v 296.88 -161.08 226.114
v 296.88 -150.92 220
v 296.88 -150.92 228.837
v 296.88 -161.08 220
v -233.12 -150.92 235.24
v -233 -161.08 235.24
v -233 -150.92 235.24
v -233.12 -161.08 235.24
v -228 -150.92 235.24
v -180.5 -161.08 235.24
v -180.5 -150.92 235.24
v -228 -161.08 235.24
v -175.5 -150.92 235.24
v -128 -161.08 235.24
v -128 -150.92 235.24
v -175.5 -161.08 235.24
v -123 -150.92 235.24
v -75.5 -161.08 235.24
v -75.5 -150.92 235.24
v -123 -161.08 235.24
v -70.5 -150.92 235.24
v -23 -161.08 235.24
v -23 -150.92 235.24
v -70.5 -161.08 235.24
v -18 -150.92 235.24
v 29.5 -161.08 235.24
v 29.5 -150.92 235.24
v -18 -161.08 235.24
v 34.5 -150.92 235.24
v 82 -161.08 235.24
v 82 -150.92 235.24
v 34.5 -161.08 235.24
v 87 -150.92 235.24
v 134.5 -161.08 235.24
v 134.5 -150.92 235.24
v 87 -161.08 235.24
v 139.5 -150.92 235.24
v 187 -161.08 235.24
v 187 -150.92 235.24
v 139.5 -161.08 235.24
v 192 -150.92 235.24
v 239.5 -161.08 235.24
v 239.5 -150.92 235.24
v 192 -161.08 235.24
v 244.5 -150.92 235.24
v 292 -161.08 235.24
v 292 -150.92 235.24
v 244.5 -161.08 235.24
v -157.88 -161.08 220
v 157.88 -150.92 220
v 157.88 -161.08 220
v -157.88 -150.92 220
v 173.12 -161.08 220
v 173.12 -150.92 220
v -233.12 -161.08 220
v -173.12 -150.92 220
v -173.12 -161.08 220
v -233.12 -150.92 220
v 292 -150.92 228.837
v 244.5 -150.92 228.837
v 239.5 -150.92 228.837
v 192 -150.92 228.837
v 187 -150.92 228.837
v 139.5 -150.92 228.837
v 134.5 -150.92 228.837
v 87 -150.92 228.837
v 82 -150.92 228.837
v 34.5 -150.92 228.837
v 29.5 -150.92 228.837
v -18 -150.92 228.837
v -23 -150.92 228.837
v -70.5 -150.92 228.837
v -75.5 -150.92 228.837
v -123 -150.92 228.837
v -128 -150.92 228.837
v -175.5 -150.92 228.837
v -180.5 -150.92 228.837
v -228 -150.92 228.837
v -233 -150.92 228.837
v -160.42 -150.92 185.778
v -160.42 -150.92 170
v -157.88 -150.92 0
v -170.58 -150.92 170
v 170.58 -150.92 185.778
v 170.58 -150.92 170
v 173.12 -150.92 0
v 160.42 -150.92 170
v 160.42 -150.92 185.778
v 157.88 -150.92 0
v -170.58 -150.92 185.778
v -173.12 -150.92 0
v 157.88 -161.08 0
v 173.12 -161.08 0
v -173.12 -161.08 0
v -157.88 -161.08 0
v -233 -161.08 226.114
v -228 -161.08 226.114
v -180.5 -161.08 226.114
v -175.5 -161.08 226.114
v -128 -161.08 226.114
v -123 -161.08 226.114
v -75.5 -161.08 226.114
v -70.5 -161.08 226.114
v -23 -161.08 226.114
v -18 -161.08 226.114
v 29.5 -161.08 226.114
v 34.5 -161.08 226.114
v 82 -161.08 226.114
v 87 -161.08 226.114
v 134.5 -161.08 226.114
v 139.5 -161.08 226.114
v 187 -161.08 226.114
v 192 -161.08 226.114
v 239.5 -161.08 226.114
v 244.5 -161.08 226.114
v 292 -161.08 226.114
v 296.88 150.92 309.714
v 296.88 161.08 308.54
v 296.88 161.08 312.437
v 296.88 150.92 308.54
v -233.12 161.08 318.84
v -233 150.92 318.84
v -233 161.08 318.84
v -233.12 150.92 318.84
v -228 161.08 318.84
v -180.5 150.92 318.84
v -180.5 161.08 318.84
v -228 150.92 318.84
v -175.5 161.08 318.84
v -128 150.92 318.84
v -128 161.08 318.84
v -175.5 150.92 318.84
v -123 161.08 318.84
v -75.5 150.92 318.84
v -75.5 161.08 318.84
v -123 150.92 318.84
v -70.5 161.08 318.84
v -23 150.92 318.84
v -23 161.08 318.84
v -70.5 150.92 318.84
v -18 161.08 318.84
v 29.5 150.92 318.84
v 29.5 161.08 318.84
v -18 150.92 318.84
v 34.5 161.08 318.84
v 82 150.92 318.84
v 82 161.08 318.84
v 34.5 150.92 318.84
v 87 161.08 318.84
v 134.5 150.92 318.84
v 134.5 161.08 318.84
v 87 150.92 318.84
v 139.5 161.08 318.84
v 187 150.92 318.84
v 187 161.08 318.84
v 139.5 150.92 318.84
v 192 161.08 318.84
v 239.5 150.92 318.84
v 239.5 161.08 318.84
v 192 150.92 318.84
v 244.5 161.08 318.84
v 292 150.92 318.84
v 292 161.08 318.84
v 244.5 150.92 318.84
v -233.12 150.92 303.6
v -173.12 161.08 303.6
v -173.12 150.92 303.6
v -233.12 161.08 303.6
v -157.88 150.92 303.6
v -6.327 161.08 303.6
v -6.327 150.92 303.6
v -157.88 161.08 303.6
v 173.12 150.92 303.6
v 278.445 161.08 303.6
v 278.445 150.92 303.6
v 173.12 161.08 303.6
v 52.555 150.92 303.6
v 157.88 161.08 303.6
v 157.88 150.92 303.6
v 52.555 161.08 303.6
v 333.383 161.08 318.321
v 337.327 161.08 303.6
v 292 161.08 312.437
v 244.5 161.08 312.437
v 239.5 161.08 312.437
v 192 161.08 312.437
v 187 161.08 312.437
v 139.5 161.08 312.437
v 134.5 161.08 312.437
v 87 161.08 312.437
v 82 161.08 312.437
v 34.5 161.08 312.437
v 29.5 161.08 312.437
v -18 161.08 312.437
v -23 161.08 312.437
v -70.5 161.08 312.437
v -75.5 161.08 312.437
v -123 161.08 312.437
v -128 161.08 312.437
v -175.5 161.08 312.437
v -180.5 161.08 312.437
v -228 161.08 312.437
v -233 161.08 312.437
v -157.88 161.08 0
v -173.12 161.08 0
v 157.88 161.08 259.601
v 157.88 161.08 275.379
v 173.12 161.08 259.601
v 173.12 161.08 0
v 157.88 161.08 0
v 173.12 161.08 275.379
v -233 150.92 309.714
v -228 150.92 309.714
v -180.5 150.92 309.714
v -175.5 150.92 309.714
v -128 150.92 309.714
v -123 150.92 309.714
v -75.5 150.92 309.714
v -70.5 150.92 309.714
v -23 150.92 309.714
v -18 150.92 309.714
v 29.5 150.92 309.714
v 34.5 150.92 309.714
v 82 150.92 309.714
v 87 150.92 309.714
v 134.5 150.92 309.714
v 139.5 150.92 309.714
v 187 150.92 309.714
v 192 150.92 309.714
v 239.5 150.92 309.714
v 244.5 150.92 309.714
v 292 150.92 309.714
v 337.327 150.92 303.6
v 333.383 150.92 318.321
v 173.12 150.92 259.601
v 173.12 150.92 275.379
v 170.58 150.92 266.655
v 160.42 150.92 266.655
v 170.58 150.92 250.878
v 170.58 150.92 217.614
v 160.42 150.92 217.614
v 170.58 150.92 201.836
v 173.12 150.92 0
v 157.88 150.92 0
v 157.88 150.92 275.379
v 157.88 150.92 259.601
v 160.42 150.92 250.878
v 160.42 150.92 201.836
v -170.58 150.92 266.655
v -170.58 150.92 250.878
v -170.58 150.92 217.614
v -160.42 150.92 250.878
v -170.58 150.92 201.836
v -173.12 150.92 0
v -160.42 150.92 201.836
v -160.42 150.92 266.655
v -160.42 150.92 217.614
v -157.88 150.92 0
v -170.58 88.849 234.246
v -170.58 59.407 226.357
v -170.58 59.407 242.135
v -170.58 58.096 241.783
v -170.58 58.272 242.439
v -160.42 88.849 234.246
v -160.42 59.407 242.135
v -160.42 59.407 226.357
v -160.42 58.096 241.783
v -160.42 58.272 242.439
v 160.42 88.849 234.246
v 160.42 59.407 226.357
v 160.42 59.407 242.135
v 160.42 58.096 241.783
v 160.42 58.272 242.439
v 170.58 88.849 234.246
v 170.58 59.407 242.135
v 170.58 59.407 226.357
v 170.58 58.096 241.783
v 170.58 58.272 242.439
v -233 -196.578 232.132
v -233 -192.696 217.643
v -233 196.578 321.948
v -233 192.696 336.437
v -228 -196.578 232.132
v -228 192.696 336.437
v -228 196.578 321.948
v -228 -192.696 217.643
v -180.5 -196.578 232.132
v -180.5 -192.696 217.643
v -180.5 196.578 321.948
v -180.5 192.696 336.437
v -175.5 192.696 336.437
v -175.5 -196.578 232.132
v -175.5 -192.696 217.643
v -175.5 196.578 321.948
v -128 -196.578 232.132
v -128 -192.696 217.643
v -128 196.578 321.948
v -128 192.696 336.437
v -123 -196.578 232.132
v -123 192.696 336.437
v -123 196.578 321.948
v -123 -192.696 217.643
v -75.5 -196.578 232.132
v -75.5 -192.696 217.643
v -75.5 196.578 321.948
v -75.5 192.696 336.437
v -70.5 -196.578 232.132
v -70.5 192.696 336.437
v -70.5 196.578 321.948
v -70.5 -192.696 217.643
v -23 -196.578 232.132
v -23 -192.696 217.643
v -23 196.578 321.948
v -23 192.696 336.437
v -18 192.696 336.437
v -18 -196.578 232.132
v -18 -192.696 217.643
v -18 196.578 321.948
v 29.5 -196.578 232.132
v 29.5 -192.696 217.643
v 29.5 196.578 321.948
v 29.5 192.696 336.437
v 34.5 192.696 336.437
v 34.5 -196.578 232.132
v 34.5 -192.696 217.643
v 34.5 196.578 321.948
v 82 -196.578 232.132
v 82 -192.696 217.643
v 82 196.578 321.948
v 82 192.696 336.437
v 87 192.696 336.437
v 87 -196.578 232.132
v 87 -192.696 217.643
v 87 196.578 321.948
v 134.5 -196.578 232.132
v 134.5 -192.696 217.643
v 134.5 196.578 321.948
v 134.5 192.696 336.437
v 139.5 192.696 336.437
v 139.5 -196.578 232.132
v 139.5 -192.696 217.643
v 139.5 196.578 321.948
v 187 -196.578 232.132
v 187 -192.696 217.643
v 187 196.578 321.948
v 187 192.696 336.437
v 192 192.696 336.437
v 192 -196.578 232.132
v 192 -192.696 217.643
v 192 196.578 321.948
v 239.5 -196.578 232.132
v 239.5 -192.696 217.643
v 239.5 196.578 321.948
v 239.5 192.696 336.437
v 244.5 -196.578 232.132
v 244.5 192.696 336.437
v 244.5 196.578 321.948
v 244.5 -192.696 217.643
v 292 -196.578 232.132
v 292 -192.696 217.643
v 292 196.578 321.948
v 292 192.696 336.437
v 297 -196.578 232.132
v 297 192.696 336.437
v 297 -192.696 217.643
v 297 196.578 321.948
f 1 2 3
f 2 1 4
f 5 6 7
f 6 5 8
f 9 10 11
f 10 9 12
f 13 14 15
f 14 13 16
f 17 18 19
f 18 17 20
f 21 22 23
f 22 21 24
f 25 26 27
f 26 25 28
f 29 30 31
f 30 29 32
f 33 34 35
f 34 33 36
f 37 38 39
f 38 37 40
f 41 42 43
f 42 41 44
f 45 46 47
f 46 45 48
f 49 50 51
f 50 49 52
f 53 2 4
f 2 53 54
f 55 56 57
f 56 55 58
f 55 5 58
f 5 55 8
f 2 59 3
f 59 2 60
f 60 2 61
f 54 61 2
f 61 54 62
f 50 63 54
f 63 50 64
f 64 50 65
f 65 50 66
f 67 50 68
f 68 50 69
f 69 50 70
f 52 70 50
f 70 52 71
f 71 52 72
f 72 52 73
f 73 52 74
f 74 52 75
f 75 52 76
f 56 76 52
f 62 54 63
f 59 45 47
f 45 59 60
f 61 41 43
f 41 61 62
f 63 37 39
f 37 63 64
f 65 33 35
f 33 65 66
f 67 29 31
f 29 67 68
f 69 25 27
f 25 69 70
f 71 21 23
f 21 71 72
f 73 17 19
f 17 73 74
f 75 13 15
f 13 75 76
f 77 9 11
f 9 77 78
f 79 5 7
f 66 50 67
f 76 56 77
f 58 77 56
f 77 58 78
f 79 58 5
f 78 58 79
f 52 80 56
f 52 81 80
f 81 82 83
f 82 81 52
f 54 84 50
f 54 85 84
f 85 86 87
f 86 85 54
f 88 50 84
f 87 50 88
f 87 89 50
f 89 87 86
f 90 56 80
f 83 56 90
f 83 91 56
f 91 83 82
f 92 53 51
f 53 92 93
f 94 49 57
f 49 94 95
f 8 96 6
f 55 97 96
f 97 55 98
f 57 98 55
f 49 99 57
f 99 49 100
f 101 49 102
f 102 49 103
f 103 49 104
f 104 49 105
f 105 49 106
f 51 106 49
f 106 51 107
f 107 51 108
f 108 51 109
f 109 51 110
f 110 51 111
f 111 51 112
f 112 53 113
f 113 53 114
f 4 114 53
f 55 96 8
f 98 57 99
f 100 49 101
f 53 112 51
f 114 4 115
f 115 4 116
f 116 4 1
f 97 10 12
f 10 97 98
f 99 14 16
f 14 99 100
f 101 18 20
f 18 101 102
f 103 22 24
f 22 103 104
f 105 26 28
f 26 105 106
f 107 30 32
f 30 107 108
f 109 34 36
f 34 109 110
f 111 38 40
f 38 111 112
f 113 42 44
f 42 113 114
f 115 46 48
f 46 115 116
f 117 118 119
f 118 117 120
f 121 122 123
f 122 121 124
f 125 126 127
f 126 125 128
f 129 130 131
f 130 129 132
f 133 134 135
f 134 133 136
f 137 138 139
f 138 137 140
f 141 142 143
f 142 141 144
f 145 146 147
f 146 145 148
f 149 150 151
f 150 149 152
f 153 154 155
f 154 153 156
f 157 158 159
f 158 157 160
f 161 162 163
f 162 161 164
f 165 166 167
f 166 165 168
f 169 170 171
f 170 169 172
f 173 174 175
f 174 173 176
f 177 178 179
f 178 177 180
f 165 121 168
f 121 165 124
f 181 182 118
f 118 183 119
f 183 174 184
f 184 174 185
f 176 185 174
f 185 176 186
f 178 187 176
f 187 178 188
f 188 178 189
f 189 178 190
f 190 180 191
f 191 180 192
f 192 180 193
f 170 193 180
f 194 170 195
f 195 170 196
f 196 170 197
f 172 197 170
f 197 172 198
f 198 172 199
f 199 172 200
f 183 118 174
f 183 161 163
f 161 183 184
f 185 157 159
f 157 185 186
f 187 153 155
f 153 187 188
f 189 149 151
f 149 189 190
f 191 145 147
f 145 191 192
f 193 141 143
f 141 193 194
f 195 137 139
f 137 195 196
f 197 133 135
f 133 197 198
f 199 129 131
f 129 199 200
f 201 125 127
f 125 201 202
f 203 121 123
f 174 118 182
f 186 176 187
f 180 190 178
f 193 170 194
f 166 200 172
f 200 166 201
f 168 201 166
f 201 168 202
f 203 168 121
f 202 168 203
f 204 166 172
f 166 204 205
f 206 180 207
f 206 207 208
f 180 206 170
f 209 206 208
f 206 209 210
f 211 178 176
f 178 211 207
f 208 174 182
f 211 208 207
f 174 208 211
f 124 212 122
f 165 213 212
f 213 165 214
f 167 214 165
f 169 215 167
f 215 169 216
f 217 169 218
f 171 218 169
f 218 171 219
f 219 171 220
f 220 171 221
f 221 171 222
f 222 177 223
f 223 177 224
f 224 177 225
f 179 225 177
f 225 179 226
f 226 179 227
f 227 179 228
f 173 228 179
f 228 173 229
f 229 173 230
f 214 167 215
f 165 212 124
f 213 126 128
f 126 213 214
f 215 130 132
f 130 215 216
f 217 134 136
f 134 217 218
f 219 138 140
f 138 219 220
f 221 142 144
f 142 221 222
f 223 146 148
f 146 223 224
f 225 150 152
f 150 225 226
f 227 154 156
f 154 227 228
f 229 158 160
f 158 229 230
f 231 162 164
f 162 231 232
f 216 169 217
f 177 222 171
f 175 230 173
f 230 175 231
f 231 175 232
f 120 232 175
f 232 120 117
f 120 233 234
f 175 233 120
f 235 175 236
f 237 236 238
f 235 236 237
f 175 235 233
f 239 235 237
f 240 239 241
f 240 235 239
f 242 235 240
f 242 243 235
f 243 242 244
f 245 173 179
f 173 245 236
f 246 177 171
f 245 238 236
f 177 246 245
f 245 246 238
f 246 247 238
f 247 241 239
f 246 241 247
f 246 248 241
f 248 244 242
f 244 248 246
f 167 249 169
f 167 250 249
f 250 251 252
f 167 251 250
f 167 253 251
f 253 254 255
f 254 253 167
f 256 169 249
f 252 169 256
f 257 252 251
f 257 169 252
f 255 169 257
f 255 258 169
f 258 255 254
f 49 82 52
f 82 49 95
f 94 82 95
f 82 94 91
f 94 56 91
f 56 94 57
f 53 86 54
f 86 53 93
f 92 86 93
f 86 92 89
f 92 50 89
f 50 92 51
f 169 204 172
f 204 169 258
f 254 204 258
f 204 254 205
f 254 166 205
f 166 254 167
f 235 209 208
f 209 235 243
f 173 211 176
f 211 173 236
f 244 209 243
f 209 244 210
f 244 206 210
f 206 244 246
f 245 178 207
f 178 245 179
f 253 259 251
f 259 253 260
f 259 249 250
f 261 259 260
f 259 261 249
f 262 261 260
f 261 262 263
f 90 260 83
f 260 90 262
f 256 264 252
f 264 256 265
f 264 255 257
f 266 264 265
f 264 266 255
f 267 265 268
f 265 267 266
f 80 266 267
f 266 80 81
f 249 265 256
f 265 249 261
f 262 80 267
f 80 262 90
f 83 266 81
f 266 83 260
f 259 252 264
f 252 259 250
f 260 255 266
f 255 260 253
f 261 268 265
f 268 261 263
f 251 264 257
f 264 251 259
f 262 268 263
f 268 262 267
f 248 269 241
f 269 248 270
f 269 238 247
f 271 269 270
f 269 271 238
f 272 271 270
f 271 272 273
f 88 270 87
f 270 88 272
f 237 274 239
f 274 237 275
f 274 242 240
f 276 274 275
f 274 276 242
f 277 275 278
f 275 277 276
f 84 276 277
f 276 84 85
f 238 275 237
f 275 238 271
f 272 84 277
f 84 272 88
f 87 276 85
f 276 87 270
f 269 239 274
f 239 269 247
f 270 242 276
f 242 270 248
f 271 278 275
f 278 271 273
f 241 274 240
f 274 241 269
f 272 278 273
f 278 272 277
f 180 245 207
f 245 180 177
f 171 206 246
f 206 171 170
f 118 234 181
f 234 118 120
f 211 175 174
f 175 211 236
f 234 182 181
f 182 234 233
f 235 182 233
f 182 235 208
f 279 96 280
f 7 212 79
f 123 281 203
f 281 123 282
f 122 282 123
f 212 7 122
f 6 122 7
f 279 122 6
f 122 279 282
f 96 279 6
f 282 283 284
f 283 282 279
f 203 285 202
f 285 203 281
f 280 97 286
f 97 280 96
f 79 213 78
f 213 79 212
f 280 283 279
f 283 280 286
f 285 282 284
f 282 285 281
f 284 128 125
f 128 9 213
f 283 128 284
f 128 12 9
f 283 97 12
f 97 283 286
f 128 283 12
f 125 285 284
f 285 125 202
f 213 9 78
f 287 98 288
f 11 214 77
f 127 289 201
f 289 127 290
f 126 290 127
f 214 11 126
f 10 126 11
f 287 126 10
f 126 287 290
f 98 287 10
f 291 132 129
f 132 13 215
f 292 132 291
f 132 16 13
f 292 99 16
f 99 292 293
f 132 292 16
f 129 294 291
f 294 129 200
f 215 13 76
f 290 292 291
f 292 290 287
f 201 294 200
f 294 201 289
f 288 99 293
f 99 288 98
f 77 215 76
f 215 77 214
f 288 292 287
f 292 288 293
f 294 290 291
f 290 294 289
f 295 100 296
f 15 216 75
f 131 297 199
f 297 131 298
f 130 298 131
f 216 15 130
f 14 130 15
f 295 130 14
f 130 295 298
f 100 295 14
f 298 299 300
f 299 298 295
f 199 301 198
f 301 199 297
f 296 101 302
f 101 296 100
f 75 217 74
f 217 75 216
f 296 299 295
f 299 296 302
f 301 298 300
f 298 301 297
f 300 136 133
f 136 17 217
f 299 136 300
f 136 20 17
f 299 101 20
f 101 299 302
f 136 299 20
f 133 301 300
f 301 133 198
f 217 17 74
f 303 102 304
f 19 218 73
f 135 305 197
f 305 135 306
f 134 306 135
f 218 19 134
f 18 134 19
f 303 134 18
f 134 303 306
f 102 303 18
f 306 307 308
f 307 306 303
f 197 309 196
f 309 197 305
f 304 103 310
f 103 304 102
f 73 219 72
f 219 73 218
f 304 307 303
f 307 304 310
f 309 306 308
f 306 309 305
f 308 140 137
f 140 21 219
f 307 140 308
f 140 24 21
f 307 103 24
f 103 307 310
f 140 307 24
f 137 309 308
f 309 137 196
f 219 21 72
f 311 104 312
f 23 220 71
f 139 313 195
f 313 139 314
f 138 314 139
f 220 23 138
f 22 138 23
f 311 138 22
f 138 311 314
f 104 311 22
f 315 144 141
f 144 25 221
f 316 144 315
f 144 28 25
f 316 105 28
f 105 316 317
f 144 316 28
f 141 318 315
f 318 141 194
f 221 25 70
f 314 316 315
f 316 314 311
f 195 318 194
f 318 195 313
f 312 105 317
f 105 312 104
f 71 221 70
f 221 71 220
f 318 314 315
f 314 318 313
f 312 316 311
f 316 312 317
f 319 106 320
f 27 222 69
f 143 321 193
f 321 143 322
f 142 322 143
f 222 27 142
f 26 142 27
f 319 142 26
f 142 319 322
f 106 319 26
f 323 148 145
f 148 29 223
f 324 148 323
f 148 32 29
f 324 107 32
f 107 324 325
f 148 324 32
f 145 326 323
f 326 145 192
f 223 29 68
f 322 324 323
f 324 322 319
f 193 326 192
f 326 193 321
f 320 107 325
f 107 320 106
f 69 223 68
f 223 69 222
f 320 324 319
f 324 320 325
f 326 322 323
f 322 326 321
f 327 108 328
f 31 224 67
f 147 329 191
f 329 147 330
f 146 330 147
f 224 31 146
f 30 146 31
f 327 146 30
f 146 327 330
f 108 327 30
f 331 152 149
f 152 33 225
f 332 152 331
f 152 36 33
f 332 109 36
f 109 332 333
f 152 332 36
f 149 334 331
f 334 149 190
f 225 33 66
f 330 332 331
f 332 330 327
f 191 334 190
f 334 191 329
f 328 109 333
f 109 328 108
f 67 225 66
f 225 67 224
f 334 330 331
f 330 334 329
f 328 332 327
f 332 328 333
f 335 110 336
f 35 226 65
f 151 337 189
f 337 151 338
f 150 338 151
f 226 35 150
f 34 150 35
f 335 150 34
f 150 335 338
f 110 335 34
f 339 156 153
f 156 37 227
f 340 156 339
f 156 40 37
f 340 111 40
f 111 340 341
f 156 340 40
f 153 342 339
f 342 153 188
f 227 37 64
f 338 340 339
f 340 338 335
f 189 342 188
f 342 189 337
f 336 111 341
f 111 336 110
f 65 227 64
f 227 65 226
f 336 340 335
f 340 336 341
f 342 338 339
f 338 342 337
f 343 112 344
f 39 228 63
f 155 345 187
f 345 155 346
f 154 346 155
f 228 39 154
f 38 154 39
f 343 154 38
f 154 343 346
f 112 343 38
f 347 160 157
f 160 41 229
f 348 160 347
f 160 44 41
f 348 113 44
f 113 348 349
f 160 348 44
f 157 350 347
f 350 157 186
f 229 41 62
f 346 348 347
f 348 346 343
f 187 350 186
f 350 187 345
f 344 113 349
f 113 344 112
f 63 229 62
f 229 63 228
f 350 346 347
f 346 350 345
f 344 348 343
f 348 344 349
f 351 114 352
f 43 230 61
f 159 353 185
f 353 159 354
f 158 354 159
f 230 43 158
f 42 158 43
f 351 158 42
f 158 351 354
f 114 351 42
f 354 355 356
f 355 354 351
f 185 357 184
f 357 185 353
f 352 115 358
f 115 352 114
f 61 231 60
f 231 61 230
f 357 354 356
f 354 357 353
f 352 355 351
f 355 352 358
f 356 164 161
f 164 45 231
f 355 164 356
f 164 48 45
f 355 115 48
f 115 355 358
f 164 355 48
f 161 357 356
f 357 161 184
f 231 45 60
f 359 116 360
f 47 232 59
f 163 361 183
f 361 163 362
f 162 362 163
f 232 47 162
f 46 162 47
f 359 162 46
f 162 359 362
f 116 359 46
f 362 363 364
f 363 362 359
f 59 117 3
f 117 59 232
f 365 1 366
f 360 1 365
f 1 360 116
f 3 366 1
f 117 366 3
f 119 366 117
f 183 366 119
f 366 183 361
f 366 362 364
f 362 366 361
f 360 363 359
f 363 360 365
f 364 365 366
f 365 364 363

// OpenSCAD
//-------------------------------------------
//-------PARAMETRE---------------------------
//-------------------------------------------

stolpeDimensjonBredde = 10.16; //4tommer
stolpeDimensjonDybde = 15.24; //6tommer

dragerDimensjonBredde = 10.16; //4tommer
dragerDimensjonHoyde = 15.24; //6tommer

skraDragerDimensjonHoyde = 15.24; //4tommer
skraDragerDimensjonDybde = 10.16; //6tommer

stolpeskoAvstandKortside = 312; 
stolpeskoAvstandLangside = 331;

stolpeHoydeNord = 220;
takVinkel = 15; //Grader

sperreDimensjonDybde = 5;
sperreDimensjonHoyde = 15;
sperreAntall = 10;
moneLengde = 530;
takutspringOst = 60;

takutspringNordSor = 40;

skraDragerJustering = -50; //Justerer skrådrager ned fra tak
skraDragerMotstaendeLengde = 100;

skraDragerOstVestLengde = 170;

//-------------------------------------------
//-------PROGRAM-----------------------------
//-------------------------------------------

stolpeHoydeForskjell = tan(takVinkel)*stolpeskoAvstandKortside;
echo(stolpeHoydeForskjell);
stolpeHoydeSor = stolpeHoydeNord + stolpeHoydeForskjell;

skraAvstand = sqrt(stolpeskoAvstandKortside ^ 2 + stolpeHoydeForskjell ^2);

sperreAvstand = (moneLengde-sperreDimensjonDybde)/sperreAntall;
echo(sperreAvstand);


nordOstSenter = [stolpeskoAvstandLangside/-2,stolpeskoAvstandKortside/-2,0];

nordVestSenter = [stolpeskoAvstandLangside/2,stolpeskoAvstandKortside/-2,0];

sorOstSenter = [stolpeskoAvstandLangside/-2,stolpeskoAvstandKortside/2,0];

sorVestSenter = [stolpeskoAvstandLangside/2,stolpeskoAvstandKortside/2,0];

stolpeSenter = [stolpeDimensjonDybde*-0.5,stolpeDimensjonBredde*-0.5,0];

translate(stolpeSenter) {
    translate([takutspringOst * -1, 0, stolpeHoydeNord]) {
        translate(nordOstSenter) {
            drager();
        }
    }

    translate([takutspringOst * -1, 0, stolpeHoydeSor]) {
        translate(sorOstSenter) {
            drager();
        }
    }

    translate(nordOstSenter) {
        stolpe(stolpeHoydeNord);
    }

    translate(nordVestSenter) {
        stolpe(stolpeHoydeNord);
    }

    translate(sorOstSenter) {
        stolpe(stolpeHoydeSor);
    }

    translate(sorVestSenter) {
        stolpe(stolpeHoydeSor);
    }
    
    forskyvningSkraDrager = (stolpeDimensjonDybde - skraDragerDimensjonDybde)/2;
    
    skraDrager(stolpeskoAvstandLangside/-2 +forskyvningSkraDrager );
    skraDragerMotstaende(stolpeskoAvstandLangside/-2 +forskyvningSkraDrager);
    
    skraDrager(stolpeskoAvstandLangside/2 + forskyvningSkraDrager);
    skraDragerMotstaende(stolpeskoAvstandLangside/2 + forskyvningSkraDrager);
    
    skraDragerSorVest();
    skraDragerSorVestMotstaende();    
    //skraDragerNordVest();
    //skraDragerNordVestMotstaende();
}

for(i = [0:1:sperreAntall]) {
    sperreNy(i);
}


//-------------------------------------------
//-------MODULES-----------------------------
//-------------------------------------------

module stolpe(hoyde) {
    cube([stolpeDimensjonDybde,stolpeDimensjonBredde,hoyde]);
}

module drager() {
    cube([moneLengde,dragerDimensjonBredde,dragerDimensjonHoyde]);
}

module skraDrager(ostVestPosisjon) {
    translate([ostVestPosisjon,stolpeskoAvstandKortside/-2 + stolpeDimensjonBredde,stolpeHoydeNord + skraDragerJustering]) {
        rotate(a= takVinkel, v = [1 ,0 ,0 ]) {
            cube([skraDragerDimensjonDybde,skraAvstand,skraDragerDimensjonHoyde]);
        }
    }
}

module skraDragerSorVest() {
    translate ([0,stolpeskoAvstandKortside/2,stolpeHoydeSor]) {
        skraDragerVest();
    }
}

module skraDragerNordVest() {
    translate ([0,stolpeskoAvstandKortside/-2,stolpeHoydeNord]) {
        skraDragerVest();
    }
}

module skraDragerVest() {
    skraDragerOstVestAvstand = skraDragerOstVestLengde * cos(takVinkel);
    
    translate([stolpeskoAvstandLangside/2 - skraDragerOstVestAvstand,0,0]) {
        rotate(a= takVinkel, v = [0 ,1 ,0 ]) {
            cube([skraDragerOstVestLengde,skraDragerDimensjonDybde,skraDragerDimensjonHoyde]);
        }
    }
}

module skraDragerSorVestMotstaende() {
    skraDragerOstVestHoyde = skraDragerOstVestLengde * sin(takVinkel);
    
    translate ([0,stolpeskoAvstandKortside/2,stolpeHoydeSor - skraDragerOstVestHoyde]) {
        skraDragerVestMotstaende();
    }
}

module skraDragerNordVestMotstaende() {
    skraDragerOstVestHoyde = skraDragerOstVestLengde * sin(takVinkel);
    
    translate ([0,stolpeskoAvstandKortside/-2,stolpeHoydeNord-skraDragerOstVestHoyde]) {
        skraDragerVestMotstaende();
    }
}

module skraDragerVestMotstaende() {
    translate([stolpeskoAvstandLangside/2+stolpeDimensjonDybde,0,0]) {
        rotate(a = takVinkel * -1, v = [0 ,1 ,0 ]) {
            cube([skraDragerOstVestLengde,skraDragerDimensjonDybde,skraDragerDimensjonHoyde]);
        }
    }
}

module skraDragerMotstaende(ostVestPosisjon) {
    skraDragerMotstaendeAvstand = skraDragerMotstaendeLengde * cos(takVinkel);
    skraDragerMotstaendeHoyde = skraDragerMotstaendeLengde * sin(takVinkel);
    
    translate([ostVestPosisjon,stolpeskoAvstandKortside/2 - skraDragerMotstaendeAvstand,stolpeHoydeNord + skraDragerJustering + stolpeHoydeForskjell - skraDragerMotstaendeHoyde]) {
        rotate(a= takVinkel * -1, v = [1 ,0 ,0 ]) {
            cube([skraDragerDimensjonDybde,skraDragerMotstaendeLengde,skraDragerDimensjonHoyde]);
        }
    }
}


module sperreNy(sperreNummer) {
    ostreSperre = stolpeskoAvstandLangside / -2 - takutspringOst -sperreDimensjonDybde;
    sperrePlasseringOstVest = ostreSperre + sperreAvstand * sperreNummer;
        translate([sperrePlasseringOstVest,0,dragerDimensjonHoyde + stolpeHoydeNord + stolpeHoydeForskjell / 2]){
        rotate ( a= takVinkel, v = [1 ,0 ,0 ]) {            
            cube([sperreDimensjonDybde,skraAvstand + takutspringNordSor * 2, sperreDimensjonHoyde],true);
        }
    }
}
